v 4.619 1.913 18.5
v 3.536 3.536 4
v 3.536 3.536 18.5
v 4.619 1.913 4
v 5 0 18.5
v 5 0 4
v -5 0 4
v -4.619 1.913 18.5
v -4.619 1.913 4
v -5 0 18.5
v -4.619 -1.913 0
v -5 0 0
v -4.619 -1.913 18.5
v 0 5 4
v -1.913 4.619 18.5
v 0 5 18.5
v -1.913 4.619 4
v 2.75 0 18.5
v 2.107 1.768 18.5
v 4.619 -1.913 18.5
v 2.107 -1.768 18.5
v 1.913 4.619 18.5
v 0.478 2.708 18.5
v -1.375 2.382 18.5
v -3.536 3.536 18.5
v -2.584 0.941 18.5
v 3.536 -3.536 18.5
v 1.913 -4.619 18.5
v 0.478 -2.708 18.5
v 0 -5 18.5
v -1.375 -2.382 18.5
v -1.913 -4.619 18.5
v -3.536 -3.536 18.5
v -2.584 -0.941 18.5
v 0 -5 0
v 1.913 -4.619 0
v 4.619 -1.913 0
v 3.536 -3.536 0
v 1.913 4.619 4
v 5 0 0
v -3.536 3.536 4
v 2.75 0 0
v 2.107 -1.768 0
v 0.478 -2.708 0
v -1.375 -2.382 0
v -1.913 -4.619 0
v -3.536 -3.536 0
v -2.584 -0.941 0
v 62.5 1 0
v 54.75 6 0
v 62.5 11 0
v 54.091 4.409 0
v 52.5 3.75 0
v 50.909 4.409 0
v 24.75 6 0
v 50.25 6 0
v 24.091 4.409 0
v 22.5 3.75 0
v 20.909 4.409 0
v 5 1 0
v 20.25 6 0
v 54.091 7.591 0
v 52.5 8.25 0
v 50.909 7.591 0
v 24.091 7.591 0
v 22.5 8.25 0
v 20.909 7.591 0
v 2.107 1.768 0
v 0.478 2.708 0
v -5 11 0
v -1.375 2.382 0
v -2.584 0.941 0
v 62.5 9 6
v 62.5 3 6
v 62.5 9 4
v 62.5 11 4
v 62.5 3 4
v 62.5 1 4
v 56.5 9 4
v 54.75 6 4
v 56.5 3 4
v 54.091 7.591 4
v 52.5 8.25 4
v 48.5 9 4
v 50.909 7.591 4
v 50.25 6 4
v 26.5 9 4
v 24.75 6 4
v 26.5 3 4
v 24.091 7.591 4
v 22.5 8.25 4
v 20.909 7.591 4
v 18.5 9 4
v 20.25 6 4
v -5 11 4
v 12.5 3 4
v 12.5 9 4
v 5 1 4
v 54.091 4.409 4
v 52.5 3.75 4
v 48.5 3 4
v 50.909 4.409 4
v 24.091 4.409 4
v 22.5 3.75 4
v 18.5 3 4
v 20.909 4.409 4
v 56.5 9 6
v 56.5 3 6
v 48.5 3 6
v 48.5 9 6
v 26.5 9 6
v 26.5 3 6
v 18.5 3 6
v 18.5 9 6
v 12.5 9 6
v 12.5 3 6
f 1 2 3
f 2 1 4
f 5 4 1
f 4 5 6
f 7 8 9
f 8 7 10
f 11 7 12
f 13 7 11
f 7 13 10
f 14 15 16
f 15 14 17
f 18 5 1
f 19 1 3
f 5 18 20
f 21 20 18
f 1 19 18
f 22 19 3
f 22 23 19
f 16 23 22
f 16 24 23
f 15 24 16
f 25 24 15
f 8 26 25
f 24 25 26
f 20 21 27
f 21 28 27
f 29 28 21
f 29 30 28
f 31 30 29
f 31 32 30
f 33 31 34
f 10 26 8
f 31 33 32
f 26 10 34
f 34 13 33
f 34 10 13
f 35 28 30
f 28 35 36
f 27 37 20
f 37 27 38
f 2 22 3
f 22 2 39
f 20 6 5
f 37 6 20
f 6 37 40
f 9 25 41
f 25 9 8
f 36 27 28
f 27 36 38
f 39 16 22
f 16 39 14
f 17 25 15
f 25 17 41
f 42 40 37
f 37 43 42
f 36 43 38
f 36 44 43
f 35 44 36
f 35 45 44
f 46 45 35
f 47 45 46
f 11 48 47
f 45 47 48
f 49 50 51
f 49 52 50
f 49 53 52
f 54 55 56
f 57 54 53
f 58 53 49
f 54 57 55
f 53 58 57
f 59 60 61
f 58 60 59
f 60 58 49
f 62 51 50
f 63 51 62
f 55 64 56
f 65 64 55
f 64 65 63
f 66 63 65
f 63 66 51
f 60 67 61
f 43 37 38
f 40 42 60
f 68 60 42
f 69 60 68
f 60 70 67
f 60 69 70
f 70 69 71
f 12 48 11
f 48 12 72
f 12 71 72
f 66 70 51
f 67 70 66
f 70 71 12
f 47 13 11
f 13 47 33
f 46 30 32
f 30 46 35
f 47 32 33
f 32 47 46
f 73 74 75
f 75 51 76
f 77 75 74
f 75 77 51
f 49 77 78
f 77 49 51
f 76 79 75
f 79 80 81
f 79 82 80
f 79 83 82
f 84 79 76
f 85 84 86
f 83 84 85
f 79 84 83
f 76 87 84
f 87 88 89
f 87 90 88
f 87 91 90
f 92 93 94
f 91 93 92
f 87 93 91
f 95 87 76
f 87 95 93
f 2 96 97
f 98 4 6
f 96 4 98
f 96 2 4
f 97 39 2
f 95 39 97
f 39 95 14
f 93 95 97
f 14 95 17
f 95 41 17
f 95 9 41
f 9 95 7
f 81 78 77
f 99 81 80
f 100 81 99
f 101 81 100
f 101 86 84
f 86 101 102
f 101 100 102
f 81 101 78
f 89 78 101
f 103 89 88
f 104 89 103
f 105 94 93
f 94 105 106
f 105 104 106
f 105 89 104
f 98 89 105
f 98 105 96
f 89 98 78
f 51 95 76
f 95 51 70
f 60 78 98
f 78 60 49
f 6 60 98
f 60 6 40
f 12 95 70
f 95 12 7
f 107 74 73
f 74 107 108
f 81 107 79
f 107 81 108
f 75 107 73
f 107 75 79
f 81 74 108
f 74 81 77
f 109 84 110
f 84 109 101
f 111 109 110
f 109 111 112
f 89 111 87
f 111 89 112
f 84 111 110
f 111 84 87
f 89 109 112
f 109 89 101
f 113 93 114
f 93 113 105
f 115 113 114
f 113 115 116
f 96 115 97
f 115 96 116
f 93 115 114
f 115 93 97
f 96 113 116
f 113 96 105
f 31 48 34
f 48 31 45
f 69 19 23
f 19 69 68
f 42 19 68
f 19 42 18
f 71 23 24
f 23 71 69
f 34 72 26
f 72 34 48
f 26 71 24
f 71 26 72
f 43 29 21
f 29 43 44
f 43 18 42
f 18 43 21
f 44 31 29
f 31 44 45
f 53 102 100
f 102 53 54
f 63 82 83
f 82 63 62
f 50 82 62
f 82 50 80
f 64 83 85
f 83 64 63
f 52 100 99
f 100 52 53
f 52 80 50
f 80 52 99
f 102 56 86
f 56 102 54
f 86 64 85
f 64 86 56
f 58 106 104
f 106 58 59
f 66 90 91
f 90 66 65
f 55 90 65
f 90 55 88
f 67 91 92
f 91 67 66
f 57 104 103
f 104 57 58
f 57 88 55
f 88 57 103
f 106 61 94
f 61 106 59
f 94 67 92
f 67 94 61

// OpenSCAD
///////////////////////////////////////////////////////////////////////////////////
// Parts for building a 3D Printer with aluminium extrusions an makerslide parts //
//                                                                               //
//  These are simple parts for using with FreeCAD (openscad module needed.       //
//  The parts are refined inside FreeCAD                                         //
//                                                                               //
//  (c) Holger Pasligh                                                           //
//  You can use this parts for your own purpose, as long you did not sell them   //
//                                                                               //
///////////////////////////////////////////////////////////////////////////////////


// idler mount for x-axis
// mounts on makerslide, adjustable by sliding on extrusion

//vars
d_fastener = 4.5;
d_idlerscrew = 5.5;


//output
x_idler_mount();
//mirror([0,0,-1])x_idler_mount();
//translate([0,0,48])mirror([0,0,1])x_idler_mount();

//construction
module x_idler_mount(){
difference(){
	union(){
		cylinder(d=10, h=18.5);
		translate([0,1,0])cube([62.5,10,4]);
		translate([-5,0,0])cube([10,11,4]);
		translate([62.5-6,3,0])cube([6,6,6]);
		translate([26.5,3,0])cube([22,6,6]);
		translate([12.5,3,0])cube([6,6,6]);
	}
	translate([0,0,-1])cylinder(d=d_idlerscrew, h=18.5+2);
	translate([52.5,6,-1])cylinder(d=d_fastener, h=4+2);
	translate([22.5,6,-1])cylinder(d=d_fastener, h=4+2);
}
}
